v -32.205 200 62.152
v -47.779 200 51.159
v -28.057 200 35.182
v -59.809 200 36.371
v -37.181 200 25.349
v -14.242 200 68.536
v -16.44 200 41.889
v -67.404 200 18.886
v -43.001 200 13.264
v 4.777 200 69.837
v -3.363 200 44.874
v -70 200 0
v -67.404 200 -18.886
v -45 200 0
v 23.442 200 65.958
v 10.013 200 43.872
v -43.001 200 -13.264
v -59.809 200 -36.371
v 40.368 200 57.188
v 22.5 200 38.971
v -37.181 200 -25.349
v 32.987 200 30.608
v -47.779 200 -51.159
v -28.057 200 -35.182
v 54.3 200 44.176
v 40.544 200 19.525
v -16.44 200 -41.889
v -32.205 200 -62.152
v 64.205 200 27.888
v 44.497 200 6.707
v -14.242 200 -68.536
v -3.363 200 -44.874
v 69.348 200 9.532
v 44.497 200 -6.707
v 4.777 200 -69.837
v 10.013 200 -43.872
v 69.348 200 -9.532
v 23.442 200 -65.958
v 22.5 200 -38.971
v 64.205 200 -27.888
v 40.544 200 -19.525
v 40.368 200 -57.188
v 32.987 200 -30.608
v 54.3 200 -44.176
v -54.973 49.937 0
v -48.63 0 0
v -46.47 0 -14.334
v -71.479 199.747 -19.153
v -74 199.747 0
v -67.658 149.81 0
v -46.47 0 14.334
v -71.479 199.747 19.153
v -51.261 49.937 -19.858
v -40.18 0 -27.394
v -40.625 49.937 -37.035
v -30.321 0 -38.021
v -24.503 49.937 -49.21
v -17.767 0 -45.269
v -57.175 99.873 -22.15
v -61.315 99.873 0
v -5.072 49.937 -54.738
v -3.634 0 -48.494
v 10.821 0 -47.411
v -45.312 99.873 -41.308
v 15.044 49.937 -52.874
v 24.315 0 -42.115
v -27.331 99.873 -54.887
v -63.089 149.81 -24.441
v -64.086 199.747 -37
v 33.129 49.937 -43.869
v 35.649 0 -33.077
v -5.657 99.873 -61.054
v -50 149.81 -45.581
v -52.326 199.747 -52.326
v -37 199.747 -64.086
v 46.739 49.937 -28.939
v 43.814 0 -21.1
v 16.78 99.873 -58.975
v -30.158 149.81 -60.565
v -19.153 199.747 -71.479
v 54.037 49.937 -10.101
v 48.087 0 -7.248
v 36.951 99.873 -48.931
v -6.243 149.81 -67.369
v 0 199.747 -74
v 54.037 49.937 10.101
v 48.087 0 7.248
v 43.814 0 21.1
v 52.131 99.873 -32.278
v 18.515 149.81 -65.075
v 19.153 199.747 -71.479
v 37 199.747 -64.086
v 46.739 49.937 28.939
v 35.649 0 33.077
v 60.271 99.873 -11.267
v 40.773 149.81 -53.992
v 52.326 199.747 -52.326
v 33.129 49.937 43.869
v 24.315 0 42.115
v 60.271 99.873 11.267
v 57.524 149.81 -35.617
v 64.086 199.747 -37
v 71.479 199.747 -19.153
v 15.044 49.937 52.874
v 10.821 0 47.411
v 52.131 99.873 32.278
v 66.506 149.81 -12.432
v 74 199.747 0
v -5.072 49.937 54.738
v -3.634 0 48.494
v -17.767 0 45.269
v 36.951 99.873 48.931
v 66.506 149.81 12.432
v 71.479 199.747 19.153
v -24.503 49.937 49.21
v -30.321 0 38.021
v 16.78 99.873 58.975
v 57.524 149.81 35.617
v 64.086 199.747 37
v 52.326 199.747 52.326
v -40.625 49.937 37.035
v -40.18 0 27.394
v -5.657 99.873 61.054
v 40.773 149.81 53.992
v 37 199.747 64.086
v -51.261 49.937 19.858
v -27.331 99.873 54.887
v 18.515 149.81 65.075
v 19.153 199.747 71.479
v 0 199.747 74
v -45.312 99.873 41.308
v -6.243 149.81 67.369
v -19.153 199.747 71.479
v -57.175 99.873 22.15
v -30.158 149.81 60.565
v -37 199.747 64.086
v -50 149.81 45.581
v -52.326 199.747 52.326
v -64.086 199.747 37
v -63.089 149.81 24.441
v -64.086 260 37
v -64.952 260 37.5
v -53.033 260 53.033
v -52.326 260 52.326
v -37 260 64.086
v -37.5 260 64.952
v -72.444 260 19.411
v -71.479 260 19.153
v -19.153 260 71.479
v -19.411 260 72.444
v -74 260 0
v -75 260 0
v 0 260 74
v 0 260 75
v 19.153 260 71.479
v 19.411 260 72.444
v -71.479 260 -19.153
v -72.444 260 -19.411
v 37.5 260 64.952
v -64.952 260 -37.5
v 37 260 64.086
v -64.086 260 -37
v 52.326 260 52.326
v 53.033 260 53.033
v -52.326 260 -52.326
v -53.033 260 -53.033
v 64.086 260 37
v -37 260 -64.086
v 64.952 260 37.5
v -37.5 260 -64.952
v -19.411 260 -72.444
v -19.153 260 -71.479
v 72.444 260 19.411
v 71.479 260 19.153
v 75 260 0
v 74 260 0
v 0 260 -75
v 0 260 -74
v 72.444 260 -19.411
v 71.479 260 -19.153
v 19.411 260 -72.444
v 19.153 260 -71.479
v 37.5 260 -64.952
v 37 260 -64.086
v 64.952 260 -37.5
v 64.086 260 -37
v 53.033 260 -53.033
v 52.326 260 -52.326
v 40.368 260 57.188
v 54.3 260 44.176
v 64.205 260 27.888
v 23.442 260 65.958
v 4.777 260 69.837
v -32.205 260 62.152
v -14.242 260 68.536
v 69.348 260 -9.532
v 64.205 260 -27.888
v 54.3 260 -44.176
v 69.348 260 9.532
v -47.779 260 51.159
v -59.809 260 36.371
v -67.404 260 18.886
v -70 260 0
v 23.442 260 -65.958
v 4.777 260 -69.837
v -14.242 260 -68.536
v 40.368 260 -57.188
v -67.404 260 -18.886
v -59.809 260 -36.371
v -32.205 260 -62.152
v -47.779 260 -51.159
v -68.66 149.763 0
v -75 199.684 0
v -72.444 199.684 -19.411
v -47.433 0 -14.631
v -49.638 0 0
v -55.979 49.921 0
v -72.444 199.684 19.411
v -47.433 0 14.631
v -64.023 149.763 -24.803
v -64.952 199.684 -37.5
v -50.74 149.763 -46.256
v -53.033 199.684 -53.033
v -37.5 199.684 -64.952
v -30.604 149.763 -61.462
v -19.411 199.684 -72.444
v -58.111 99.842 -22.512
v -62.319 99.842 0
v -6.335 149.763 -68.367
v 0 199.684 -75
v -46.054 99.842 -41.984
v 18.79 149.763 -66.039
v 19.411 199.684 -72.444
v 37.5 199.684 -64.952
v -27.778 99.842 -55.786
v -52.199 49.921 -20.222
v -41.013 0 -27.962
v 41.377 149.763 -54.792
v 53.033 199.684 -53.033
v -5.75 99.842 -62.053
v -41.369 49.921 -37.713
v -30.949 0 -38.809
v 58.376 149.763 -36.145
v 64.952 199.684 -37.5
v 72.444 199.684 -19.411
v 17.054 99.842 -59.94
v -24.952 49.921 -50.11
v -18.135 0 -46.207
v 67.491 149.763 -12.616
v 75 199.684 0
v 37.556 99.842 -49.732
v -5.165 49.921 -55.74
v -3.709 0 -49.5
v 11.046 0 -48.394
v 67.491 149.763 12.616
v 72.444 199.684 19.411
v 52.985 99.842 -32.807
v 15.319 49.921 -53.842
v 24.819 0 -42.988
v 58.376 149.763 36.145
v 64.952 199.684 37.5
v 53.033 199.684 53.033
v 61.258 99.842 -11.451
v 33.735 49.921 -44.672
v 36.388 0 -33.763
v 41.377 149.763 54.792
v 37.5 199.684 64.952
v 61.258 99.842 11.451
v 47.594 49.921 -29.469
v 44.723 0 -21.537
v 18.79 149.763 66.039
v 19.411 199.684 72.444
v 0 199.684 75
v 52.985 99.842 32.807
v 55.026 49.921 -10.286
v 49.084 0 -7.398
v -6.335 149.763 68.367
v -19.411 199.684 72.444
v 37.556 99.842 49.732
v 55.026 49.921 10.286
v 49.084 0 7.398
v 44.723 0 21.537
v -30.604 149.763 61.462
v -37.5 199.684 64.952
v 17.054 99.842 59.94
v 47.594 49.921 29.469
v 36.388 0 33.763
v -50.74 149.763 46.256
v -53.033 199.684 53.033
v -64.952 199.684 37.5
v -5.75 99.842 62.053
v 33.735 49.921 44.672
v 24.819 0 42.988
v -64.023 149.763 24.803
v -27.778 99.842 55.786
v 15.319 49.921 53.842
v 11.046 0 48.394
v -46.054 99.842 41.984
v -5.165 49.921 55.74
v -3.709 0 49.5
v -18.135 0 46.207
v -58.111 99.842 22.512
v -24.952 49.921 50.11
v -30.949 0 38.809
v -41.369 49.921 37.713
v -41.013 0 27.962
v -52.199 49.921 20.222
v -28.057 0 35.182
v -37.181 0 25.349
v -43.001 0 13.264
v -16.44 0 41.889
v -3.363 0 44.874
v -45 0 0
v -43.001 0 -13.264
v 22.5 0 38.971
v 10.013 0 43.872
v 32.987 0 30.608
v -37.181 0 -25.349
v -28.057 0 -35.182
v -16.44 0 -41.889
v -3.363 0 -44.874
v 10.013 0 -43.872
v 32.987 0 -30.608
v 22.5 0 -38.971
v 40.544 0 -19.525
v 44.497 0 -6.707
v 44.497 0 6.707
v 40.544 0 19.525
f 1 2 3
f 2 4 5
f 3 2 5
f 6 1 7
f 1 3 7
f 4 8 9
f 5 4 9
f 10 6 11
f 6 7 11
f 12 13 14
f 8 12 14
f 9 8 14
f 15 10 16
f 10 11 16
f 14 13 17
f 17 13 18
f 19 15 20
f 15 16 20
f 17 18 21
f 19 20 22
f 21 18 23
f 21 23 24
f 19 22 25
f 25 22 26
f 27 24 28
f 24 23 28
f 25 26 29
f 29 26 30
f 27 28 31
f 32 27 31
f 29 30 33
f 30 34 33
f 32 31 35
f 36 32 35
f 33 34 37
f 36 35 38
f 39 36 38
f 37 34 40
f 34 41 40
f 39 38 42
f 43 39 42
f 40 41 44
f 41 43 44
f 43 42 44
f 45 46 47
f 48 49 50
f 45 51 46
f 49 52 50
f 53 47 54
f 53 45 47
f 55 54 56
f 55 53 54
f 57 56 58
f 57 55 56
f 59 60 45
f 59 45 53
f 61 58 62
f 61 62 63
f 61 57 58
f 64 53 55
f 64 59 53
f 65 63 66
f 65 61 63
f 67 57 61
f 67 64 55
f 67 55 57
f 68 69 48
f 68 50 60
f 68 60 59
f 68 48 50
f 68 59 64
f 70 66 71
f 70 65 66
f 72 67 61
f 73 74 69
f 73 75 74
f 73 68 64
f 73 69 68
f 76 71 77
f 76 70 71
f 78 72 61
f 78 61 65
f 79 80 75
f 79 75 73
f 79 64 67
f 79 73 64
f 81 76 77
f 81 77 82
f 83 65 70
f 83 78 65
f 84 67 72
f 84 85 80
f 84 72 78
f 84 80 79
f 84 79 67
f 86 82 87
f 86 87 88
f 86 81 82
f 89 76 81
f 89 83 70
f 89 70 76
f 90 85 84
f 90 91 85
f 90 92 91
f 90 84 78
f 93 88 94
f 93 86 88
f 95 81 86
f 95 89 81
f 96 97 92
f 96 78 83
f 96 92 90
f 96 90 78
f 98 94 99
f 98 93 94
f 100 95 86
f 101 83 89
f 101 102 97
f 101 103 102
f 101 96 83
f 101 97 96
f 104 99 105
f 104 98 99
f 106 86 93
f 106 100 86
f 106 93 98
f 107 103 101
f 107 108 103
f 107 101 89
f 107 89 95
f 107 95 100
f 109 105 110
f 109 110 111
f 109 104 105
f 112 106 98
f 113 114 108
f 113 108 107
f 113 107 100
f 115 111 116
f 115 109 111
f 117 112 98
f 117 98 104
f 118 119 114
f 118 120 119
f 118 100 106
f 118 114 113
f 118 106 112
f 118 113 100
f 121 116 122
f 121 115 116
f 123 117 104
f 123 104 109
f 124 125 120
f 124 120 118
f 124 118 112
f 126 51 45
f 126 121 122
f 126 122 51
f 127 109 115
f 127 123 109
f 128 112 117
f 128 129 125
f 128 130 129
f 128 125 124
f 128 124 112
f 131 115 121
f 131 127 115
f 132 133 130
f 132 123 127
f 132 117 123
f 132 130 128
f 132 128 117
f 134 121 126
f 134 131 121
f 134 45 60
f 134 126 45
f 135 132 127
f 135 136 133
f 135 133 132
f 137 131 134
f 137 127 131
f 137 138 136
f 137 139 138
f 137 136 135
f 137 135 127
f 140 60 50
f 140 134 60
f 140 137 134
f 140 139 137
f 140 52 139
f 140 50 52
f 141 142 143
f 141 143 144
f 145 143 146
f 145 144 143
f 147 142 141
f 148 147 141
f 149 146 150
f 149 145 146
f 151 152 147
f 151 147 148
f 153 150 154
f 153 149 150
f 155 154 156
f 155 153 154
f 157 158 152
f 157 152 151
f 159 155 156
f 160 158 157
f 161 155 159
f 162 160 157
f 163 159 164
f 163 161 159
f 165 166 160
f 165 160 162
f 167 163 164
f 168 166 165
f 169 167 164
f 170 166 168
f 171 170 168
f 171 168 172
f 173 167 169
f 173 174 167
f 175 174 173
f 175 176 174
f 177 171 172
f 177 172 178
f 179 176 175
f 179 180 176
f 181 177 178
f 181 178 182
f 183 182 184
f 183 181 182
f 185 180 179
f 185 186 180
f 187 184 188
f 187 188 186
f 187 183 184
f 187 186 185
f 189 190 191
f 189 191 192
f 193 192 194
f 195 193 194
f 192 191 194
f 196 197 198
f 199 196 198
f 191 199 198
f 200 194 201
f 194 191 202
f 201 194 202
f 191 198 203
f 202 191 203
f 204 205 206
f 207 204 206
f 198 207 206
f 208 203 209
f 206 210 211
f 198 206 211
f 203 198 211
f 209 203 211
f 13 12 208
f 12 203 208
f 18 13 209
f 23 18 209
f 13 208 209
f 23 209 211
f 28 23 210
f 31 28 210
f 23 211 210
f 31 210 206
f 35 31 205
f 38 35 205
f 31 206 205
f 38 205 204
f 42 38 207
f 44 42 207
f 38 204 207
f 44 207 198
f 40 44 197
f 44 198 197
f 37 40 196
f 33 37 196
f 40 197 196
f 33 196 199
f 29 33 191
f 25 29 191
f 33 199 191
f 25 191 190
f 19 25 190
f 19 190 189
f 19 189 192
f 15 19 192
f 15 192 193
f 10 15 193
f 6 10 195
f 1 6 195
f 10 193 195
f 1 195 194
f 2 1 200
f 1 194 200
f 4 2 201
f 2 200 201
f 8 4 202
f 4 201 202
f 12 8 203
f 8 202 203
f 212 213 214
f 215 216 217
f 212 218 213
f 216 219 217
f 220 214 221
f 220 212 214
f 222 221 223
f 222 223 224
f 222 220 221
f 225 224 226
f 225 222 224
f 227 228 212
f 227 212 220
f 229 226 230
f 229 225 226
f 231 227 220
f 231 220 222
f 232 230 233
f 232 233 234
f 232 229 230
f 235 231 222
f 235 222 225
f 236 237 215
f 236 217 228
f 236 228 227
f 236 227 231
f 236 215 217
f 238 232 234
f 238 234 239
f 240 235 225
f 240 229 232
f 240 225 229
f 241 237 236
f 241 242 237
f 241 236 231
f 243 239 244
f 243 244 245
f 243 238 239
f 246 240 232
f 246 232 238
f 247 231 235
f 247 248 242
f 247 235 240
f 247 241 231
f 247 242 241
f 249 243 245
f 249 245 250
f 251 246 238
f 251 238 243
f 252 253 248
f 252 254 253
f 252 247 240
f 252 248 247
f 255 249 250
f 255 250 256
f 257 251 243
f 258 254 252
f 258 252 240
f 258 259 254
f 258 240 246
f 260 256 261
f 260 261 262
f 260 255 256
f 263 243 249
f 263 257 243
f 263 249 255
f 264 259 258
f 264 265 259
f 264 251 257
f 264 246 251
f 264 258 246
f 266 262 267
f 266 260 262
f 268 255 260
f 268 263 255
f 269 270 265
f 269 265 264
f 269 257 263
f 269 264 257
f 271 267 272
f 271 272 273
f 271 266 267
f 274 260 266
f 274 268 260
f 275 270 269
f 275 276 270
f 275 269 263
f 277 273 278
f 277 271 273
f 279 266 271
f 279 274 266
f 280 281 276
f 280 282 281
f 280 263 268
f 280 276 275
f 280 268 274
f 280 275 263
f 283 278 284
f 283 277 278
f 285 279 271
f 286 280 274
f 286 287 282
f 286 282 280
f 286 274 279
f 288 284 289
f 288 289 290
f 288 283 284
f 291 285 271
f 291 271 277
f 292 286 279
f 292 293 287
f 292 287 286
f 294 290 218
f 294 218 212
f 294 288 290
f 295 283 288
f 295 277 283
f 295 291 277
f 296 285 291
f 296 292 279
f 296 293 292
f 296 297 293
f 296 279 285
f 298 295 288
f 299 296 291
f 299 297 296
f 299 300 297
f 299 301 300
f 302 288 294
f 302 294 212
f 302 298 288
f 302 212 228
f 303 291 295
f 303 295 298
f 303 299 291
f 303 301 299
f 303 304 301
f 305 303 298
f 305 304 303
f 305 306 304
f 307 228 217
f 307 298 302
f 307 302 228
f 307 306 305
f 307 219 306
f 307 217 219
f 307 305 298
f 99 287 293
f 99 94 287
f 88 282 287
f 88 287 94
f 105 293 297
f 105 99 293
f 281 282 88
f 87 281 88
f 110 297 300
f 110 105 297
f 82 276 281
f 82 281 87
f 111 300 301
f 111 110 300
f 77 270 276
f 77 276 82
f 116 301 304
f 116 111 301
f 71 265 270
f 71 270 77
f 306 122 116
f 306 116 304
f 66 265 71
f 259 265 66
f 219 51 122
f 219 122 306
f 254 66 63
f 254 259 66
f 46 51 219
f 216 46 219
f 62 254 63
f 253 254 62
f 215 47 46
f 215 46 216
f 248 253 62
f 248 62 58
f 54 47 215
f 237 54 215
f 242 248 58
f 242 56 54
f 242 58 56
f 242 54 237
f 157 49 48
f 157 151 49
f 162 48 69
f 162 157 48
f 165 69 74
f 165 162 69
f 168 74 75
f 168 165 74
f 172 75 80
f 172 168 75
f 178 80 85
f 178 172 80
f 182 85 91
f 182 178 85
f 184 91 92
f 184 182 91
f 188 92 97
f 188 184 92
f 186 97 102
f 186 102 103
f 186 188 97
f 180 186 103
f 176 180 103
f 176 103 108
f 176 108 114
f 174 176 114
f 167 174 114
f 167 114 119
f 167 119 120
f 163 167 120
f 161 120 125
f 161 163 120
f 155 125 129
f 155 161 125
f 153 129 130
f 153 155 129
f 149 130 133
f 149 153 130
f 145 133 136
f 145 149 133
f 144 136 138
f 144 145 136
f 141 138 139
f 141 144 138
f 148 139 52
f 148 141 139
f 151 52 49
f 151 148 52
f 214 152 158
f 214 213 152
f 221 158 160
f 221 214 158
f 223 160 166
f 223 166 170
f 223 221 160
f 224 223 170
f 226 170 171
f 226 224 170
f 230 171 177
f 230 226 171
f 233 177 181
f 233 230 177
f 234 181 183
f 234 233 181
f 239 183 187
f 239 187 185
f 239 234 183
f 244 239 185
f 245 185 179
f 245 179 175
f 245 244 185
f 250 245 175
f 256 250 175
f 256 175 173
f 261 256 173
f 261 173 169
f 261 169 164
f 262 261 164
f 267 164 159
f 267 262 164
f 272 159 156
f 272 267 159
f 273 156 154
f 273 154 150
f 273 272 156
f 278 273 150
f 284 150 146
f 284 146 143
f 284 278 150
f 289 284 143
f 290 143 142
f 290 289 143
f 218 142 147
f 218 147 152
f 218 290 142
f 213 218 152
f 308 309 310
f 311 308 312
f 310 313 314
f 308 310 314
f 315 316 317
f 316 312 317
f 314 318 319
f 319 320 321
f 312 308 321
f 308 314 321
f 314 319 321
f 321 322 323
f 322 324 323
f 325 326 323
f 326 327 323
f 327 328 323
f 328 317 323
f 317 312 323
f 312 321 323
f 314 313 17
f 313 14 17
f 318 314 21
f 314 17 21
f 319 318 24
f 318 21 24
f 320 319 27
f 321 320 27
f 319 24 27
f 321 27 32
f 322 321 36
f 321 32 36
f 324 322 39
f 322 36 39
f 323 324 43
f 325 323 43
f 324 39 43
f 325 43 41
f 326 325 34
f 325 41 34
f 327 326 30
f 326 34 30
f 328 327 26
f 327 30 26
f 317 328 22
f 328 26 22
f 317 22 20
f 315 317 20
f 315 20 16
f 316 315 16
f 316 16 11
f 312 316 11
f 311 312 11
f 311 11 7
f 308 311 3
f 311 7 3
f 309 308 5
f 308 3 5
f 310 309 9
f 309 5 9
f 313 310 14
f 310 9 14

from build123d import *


with BuildPart() as part:
    # Sketch1 → rough engine (revolve)
    with BuildSketch(Plane.XY, mode=Mode.PRIVATE) as rough_engine_sk:
        Polygon((0, 0), (45, 0), (45, 200), (70, 200), (70, 260), (0, 260), align=None)
    revolve(rough_engine_sk.sketch.rotate(Axis((0, 260, 0), (0, -1, 0)), 180), axis=Axis((0, 260, 0), (0, -1, 0)))


with BuildPart() as body_2:
    # Sketch2 → Revolve2 (revolve)
    with BuildSketch(Plane.XY, mode=Mode.PRIVATE) as revolve2_sk:
        Polygon((75, 260), (75, 199.683748808), (49.638449337, 0), (48.630416014, 0), (74, 199.746999046), (74, 260), align=None)
    revolve(revolve2_sk.sketch.rotate(Axis((0, 260, 0), (0, -1, 0)), 180), axis=Axis((0, 260, 0), (0, -1, 0)))


solid = Compound([part.part, body_2.part])
